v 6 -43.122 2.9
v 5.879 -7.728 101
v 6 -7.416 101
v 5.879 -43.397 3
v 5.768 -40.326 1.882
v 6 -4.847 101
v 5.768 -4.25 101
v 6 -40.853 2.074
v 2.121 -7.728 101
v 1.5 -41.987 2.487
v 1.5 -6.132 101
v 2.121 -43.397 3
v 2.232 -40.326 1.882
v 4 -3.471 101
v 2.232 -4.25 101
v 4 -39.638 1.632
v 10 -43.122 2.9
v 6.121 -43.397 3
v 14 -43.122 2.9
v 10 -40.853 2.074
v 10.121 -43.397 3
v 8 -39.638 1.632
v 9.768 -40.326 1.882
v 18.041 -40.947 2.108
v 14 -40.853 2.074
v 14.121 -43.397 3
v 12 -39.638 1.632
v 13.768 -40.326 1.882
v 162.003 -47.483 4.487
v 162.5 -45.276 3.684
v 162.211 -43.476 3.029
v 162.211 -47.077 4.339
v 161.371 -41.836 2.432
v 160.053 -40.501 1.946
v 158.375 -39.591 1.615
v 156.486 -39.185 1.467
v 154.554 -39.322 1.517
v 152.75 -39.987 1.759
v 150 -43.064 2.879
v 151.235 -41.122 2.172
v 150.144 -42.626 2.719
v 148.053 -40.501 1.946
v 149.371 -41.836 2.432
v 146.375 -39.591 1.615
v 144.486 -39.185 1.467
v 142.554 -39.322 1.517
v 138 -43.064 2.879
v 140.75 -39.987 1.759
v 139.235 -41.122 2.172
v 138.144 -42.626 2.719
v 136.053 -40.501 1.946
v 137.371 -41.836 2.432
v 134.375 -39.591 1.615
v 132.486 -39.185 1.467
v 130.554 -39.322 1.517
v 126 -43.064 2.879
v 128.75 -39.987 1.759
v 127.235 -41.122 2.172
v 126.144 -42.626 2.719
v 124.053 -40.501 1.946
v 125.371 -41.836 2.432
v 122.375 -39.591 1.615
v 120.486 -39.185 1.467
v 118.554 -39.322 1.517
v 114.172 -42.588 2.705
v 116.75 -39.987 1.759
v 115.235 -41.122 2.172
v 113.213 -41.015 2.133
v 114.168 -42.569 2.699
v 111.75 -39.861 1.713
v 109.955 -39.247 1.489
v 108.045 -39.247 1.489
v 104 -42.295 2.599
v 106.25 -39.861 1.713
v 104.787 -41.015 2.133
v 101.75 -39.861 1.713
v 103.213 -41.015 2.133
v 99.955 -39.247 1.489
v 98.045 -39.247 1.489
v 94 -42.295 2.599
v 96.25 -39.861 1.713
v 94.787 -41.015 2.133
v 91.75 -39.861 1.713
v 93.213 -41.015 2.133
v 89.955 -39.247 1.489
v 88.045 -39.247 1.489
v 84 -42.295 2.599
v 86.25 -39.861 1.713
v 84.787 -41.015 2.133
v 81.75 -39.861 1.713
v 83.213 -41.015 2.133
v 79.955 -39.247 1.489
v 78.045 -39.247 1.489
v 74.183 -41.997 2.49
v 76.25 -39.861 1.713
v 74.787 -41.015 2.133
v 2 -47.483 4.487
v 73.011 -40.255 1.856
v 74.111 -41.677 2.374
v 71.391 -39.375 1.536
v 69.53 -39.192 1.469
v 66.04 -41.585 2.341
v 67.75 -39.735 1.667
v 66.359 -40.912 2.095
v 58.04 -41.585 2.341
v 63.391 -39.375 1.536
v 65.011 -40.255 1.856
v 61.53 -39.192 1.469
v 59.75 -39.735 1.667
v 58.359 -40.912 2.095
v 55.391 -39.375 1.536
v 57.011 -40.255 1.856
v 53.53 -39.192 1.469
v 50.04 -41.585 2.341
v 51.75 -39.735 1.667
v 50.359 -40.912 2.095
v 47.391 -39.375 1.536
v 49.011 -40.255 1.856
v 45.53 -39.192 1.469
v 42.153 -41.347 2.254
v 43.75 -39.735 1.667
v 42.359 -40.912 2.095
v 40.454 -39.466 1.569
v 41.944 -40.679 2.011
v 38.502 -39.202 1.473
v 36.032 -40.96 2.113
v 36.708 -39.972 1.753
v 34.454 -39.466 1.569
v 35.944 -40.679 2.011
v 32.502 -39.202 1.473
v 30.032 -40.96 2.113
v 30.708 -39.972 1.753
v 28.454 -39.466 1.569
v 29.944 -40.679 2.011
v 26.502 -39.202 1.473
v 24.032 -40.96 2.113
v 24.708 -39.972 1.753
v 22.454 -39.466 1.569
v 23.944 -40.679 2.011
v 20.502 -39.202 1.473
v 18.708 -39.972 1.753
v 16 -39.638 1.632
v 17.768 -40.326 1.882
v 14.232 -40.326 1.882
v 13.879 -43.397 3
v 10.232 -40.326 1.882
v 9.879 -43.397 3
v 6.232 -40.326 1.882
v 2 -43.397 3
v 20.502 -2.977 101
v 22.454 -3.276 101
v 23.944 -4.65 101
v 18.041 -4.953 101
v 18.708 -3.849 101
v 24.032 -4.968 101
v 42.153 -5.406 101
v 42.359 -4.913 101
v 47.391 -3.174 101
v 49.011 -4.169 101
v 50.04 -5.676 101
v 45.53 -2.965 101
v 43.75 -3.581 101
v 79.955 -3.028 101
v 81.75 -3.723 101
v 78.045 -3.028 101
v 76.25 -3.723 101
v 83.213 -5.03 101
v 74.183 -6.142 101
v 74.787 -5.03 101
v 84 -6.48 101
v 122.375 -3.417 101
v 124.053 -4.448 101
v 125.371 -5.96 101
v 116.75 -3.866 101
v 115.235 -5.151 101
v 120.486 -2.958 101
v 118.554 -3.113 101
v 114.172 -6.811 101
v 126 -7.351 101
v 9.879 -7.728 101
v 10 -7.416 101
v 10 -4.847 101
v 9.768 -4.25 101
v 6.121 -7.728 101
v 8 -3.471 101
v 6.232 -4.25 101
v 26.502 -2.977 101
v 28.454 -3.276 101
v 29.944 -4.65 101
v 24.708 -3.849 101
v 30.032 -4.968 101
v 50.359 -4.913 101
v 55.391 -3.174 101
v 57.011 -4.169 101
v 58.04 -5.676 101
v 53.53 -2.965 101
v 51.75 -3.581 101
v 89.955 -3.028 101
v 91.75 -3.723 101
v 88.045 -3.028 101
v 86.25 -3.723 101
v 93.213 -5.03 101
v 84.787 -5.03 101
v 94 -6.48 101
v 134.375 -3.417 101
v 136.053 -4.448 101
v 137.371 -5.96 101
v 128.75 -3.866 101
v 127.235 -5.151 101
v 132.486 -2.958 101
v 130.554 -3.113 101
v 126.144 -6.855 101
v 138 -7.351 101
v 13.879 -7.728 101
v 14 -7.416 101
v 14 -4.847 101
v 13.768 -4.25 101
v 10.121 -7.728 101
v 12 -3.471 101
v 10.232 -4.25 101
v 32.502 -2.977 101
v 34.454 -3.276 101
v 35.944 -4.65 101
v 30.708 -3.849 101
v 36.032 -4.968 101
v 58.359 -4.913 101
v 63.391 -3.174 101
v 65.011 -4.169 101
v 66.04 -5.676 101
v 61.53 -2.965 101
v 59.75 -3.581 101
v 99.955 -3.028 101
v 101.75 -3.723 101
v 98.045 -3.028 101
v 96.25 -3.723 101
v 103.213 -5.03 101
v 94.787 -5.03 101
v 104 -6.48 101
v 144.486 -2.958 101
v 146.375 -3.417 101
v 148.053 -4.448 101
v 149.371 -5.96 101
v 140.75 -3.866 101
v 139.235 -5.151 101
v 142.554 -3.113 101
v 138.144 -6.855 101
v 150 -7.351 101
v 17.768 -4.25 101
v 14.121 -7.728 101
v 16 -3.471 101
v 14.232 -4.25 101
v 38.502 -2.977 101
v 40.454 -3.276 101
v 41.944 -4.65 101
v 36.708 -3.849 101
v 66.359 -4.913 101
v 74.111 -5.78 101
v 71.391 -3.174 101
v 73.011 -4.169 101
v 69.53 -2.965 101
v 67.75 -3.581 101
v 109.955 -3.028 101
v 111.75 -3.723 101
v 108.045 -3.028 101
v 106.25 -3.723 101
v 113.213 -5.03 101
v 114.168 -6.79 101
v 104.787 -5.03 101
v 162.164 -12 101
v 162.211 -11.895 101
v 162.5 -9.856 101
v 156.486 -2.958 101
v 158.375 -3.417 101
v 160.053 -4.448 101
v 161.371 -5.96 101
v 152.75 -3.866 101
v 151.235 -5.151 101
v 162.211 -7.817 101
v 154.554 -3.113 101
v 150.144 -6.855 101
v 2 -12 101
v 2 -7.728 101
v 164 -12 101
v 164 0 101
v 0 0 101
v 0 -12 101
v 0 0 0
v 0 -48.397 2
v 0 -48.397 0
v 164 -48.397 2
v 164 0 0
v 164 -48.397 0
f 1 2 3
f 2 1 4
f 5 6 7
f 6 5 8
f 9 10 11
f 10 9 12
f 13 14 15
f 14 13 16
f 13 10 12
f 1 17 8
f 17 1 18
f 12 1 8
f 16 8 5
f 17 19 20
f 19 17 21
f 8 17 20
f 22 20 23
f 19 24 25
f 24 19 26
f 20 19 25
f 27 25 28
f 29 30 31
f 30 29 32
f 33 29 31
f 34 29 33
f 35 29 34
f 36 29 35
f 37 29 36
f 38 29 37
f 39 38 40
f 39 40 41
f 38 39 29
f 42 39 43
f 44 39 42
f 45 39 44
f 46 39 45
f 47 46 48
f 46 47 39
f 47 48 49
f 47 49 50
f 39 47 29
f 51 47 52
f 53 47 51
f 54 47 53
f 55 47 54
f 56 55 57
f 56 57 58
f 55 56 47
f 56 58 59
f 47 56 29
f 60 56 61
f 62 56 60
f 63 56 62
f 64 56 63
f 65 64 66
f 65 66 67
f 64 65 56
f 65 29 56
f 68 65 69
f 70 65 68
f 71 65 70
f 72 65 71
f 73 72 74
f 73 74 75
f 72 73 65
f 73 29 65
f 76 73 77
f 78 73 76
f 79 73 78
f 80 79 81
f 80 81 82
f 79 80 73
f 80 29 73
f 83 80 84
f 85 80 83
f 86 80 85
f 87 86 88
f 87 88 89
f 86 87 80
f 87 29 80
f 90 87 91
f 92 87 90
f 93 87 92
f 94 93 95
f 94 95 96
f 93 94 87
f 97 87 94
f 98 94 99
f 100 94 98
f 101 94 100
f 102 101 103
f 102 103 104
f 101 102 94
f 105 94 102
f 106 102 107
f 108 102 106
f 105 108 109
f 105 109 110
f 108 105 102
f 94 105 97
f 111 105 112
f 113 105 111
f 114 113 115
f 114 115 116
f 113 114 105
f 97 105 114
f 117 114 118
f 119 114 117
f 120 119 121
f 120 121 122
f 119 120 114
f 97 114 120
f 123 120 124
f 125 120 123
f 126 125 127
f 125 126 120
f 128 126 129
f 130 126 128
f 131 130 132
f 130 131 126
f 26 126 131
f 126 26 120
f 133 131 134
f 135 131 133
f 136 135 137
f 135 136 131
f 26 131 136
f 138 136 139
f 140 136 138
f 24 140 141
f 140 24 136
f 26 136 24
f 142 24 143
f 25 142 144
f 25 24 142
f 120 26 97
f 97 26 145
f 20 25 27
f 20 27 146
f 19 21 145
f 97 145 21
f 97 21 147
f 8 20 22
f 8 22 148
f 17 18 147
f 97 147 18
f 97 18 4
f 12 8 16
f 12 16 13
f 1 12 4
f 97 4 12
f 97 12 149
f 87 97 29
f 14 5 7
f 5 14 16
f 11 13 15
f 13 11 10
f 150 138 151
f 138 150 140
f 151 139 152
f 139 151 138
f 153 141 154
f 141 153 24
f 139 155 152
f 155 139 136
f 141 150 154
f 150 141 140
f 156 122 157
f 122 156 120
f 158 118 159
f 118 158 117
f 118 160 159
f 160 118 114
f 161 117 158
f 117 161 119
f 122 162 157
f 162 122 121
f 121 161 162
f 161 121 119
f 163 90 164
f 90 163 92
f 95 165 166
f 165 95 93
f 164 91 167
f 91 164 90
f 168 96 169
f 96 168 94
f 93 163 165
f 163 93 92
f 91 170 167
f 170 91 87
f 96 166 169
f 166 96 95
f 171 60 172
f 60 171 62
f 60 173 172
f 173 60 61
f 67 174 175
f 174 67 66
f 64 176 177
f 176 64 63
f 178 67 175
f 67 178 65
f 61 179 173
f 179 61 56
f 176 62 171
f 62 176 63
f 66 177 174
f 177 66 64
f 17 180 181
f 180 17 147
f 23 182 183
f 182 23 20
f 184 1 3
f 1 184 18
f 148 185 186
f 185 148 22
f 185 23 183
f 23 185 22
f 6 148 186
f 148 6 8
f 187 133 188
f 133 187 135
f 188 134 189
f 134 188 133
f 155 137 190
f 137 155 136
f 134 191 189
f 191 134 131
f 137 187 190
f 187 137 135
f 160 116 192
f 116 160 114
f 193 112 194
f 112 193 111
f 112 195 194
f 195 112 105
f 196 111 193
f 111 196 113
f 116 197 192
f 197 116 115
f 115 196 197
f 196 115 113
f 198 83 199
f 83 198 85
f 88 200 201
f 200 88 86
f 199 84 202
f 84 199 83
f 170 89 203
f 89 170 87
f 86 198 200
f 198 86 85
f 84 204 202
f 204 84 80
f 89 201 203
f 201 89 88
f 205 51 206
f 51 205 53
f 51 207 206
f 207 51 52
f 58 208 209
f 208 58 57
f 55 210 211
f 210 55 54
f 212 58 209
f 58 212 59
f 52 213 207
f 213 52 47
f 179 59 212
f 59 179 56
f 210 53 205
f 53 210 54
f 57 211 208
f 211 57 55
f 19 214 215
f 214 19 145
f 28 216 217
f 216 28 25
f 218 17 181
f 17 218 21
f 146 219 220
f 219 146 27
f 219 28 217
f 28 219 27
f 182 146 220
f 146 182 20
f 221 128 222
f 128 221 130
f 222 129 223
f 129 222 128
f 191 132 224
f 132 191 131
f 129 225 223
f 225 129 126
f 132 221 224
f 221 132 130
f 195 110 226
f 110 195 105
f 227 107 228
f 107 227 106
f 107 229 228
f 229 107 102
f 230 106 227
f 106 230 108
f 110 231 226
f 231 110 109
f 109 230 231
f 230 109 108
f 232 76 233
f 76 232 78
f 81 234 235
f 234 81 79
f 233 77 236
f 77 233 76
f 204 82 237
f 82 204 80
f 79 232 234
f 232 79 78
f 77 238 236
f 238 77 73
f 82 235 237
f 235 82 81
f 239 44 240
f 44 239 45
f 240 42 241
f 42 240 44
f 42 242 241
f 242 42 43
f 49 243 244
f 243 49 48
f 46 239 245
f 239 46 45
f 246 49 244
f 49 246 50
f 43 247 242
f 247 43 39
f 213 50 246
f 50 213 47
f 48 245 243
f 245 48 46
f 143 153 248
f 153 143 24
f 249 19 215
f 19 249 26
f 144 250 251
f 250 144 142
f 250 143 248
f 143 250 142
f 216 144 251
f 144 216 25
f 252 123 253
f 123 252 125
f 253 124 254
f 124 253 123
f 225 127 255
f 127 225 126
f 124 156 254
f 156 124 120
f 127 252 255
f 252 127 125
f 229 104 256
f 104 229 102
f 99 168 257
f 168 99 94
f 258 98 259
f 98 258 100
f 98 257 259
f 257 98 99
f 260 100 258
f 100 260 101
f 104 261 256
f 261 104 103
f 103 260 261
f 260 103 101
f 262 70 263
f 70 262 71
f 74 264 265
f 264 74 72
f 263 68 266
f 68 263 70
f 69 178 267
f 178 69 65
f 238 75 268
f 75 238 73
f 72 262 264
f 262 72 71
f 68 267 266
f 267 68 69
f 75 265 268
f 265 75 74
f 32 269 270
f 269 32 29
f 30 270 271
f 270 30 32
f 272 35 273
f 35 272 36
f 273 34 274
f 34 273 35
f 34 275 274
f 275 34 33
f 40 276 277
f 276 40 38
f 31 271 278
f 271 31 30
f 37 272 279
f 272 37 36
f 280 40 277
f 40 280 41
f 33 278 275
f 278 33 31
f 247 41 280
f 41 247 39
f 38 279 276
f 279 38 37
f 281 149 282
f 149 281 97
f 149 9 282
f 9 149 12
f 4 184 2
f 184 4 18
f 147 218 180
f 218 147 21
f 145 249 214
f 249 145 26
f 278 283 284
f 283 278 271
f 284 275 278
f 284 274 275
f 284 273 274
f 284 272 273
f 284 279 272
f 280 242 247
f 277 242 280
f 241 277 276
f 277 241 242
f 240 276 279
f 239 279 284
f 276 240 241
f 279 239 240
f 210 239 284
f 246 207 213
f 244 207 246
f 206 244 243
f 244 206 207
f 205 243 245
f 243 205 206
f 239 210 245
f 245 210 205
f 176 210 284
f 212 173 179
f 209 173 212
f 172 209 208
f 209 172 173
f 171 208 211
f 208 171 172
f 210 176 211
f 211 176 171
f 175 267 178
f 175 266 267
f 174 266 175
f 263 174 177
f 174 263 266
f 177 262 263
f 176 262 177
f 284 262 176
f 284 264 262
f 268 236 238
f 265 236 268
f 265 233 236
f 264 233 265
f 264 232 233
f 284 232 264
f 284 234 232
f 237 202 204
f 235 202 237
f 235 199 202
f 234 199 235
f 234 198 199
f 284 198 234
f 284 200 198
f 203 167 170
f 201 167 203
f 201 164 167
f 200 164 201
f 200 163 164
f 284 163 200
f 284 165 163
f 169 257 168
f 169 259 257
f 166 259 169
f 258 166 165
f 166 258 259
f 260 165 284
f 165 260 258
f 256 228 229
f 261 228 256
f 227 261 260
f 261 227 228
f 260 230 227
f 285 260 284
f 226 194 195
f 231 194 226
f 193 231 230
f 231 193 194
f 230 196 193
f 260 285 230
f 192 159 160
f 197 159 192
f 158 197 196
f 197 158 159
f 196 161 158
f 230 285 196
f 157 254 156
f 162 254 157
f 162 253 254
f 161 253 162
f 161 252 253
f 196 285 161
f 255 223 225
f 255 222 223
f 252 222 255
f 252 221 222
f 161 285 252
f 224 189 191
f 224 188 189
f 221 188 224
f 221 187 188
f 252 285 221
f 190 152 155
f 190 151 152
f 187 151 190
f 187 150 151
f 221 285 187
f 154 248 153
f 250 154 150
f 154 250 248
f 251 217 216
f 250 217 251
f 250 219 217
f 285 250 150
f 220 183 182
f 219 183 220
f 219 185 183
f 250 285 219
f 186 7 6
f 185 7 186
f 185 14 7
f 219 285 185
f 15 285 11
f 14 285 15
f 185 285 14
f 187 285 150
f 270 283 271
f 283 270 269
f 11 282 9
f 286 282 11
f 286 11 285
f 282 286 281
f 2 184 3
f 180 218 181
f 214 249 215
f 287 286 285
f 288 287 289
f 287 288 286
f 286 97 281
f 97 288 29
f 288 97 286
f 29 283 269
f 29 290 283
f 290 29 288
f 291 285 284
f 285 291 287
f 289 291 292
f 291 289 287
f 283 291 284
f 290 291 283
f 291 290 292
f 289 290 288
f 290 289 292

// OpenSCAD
// file: config.scad
//$fs=$fs/2;
//$fa=$fa/2;

r4 = 2.2;
r8 = 4.2;
r10 = 5.2;

layer_height = 0.25;

switch_d = 9.6;

nema17_r_vis = 15.5;
nema17_r_centre = 11.5;
nema17_h_centre = 2;
nema17_h = 43;
nema17_l = 40;

boite_ui_largeur = 28.5;
boite_ui_l = 46;

support_laser = 24;

r3 = 1.75;
r3_2d = 1.5;
r3_vis = 1.65;
r3_head = 3.6;
m3_r = r3;
m3_nut_d = 7;
m3_nut_d2 = 6.2;
m3_nut_h = 3;

m4_r = 2.3;
m4_nut_d = 8.4;
m4_nut_d2 = 7.5;
m4_nut_h = 3.5;

608_r = 23/2;
608_h = 8;

laser_printer_l = 609;
laser_printer_lg = 456;


module support_nut(d=3, l_screw1 = 20, l_screw2 = 20, l_nut = 20, h_screw2 = 0.2){
    if(d==3){
        screw_r = r3;
        nut_r = m3_nut_d/2;
        nut_h = m3_nut_h;
        cylinder(nut_h, r = nut_r, $fn = 6, center = true);
        translate([0, 0, -l_screw1])cylinder(l_screw1 +1, r = screw_r, $fn = 8);
        translate([0, 0, m3_nut_h/2+ h_screw2])cylinder(l_screw2, r = screw_r, $fn = 8);
        l = m3_nut_d*cos(30);
        translate([0, -l/2, -nut_h/2]) cube([l_nut, l,nut_h]);
    } else if(d==4){
        screw_r = r4;
        nut_r = m4_nut_d/2;
        nut_h = m4_nut_h;
        cylinder(nut_h, r = nut_r, $fn = 6, center = true);
        translate([0, 0, -l_screw1])cylinder(l_screw1 +1, r = screw_r, $fn = 8);
        translate([0, 0, m4_nut_h/2+ h_screw2])cylinder(l_screw2, r = screw_r, $fn = 8);
        l = m4_nut_d*cos(30);
        translate([0, -l/2, -nut_h/2]) cube([l_nut, l,nut_h]);
    }
}


module nut(d=3, center = false){
    nut_r = m3_nut_d/2;
    nut_h = m3_nut_h;
    if(d==3){
        nut_r = m3_nut_d/2;
        nut_h = m3_nut_h;
    } 
    cylinder(nut_h, r = nut_r, $fn = 6, center = center);
}



module m3(h, nut = false, head = false){
    cylinder(h, m3_r, m3_r, $fn=16);
    if(nut){
        cylinder(m3_nut_h, r = m3_nut_d/2, $fn = 6);
    }
}

module m3_nut(h){
    cylinder(m3_nut_h, r = m3_nut_d/2, $fn = 6);
    translate([0, -m3_nut_d2/2, 0]) cube([h, m3_nut_d2, m3_nut_h]);
}

module m4(h, nut = false, head = false){
    cylinder(h, m4_r, m4_r);
    if(nut){
        cylinder(m4_nut_h, r = m4_nut_d/2, $fn = 6);
    }
}

module m5(h, nut = false, head = false){
    cylinder(h, r = 2.7);
}

m8_nut_d = 15;
m8_nut_d2 = 13;
m8_nut_h = 6.5;
module m8(h, nut = false, head = false){
    cylinder(h, r = r8);
    if(nut){
        cylinder(m8_nut_h, r = m8_nut_d/2, $fn = 6);
    }
}

module cube_arrondi(x, y, z, r=2){
    hull(){
        translate([(x/2-r), (y/2-r), 0]) cylinder(z,r=r);
        translate([(x/2-r), -(y/2-r), 0]) cylinder(z,r=r);
        translate([-(x/2-r), (y/2-r), 0]) cylinder(z,r=r);
        translate([-(x/2-r), -(y/2-r), 0]) cylinder(z,r=r);
    }
}

module demi_glissiere(r, l, h){
    cylinder(h, r, r);
    translate([-r, 0, 0]) cube([r*2, l, h]);
}


module nema17_2d(){
    nema17_l = 43;
    nema17_h = 3;
    polygon([[0,nema17_h], [nema17_h,0]
            , [nema17_l-nema17_h,0],[nema17_l,nema17_h]
            , [nema17_l,nema17_l-nema17_h],[nema17_l-nema17_h,nema17_l]
            , [nema17_h,nema17_l],[0,nema17_l-nema17_h] ]);
}

module nema17_2d2(){
    translate([nema17_r_vis, nema17_r_vis] ) circle(r3_2d);
    translate([nema17_r_vis, -nema17_r_vis] ) circle(r3_2d);
    translate([-nema17_r_vis, nema17_r_vis] ) circle(r3_2d);
    translate([-nema17_r_vis, -nema17_r_vis] ) circle(r3_2d);
    circle(nema17_r_centre);
}


module nema17(){
    translate([-nema17_h/2, -nema17_h/2, -nema17_l/2] ) linear_extrude(nema17_l) nema17_2d();
    
    h = nema17_h/2+6;
    translate([nema17_r_vis, nema17_r_vis, 0] )rotate([0, 0, 0]) cylinder(h, r = r3);
    translate([nema17_r_vis, -nema17_r_vis, 0] )rotate([0, 0, 0]) cylinder(h, r = r3);
    translate([-nema17_r_vis, nema17_r_vis, 0] )rotate([0, 0, 0]) cylinder(h, r = r3);
    translate([-nema17_r_vis, -nema17_r_vis, 0] )rotate([0, 0, 0]) cylinder(h, r = r3);
    cylinder(h, nema17_r_centre, nema17_r_centre);
    cylinder(h+14, r = 8);
    
    translate([-8.5, 0, -nema17_l/2] ) cube([17,30, 10]);
}

module corner(l_corner, h_corner, lg_corner){
    translate([0, lg_corner, 0]) rotate([90, 0, 0]) linear_extrude(lg_corner) polygon([[0,0], [l_corner, 0], [0, h_corner]]);
}

nema17();

/**
 * 2D
 **/

module m3_2d(){
    circle(r3_2d);
}


module cran_x(_l, e, cran, inv){
    difference(){
        square([_l, e]);
        if(inv){
            for(i=[-round(_l/cran):round(_l/cran)]){
                translate([_l/2 + cran/2 - 2*i*cran, -1]) square([cran, e+2]);
            }
        }else{
            for(i=[-round(_l/cran):round(_l/cran)]){
                translate([_l/2 - cran/2 - 2*i*cran, -1]) square([cran, e+2]);
            }
        }
    }
}

module cran_y(_l, e, cran, inv){
    translate([e, 0]) rotate([0, 0, 90]) cran_x(_l, e, cran, inv); 
}

module whole_2d(type_vis){
    if(type_vis == 3){
        circle(1.5);
    } else if(type_vis == 4){
        circle(2);
    } else {
        echo("whole_2d " + type_vis);
    }
}

module nuts_2d(type_vis){
    if(type_vis == 3){
        translate([-1.5, 0])square([3, 20]);
        translate([-5.5/2, 10])square([5.5, 2.5]);
    } else if(type_vis == 4){
        translate([-2, 0])square([4, 30]);
        translate([-7/2, 20])square([7, 3.5]);
    } else {
        echo("nuts_2d " + type_vis);
    }
}

module cran_x_vis(_l, e, cran, type_vis = 3, trous = [0.1, 0.5, 0.9]){
    difference(){
        square([_l, e]);
        for(i=[-round(_l/cran):round(_l/cran)]){
                translate([_l/2 - cran/2 - 2*i*cran, -1]) square([cran, e+2]);
            }
        
    }
    for(i = trous){
        j = round((i-0.5)*_l/(2*cran));
        translate([_l/2  - 2*j*cran, e/2]) whole_2d(type_vis);
    }
}

module cran_x_nuts(_l, e, cran, type_vis = 3, trous = [0.1, 0.5, 0.9]){
    difference(){
        square([_l, e]);
        for(i=[-round(_l/cran):round(_l/cran)]){
                translate([_l/2 + cran/2 - 2*i*cran, -1]) square([cran, e+2]);
        }
    }
    for(i = trous){
        j = round((i-0.5)*_l/(2*cran));
        translate([_l/2  - 2*j*cran, e/2]) nuts_2d(type_vis);
    }
}

module cran_y_vis(_l, e, cran, type_vis = 3, trous = [0.1, 0.5, 0.9]){
    translate([e, 0]) rotate([0, 0, 90]) cran_x_vis(_l, e, cran, type_vis, trous);
}

module cran_y_nuts(_l, e, cran, type_vis = 3, trous = [0.1, 0.5, 0.9]){
    translate([0, _l]) rotate([0, 0, -90]) cran_x_nuts(_l, e, cran, type_vis, trous);
}
// main file
use <config.scad>

h = 100;
e2 = 10;
e=2;

angle = 20;
l = tan(angle)*h;

re = 10;

nb = 4;



/*n=10;
pas = 10;
r_pas = 5.5;
lg=pas*n+2*e;

module toto2(){
    difference(){
       hull(){
           translate([0,0,0])cube([lg, l+e2+e, 2]);
           translate([0,0,h]) cube([ lg, e2+e,1]);
       }
       //translate([-lg/2+e,l+e,e]) rotate([angle,0,0])cube([lg-2*e,10,2*h]);
       
       translate([e,l+e+e2/2,e]) rotate([angle,0,0])cube([lg-2*e,10,2*h]);
       for(i= [0 : n-1] ){
            translate([(i+0.5)*pas+e,l+e+e2/2,e]) rotate([angle,0,0]) cylinder(r=r_pas,2*h);
       }
           
   }
}*/


n = 4;

pas0=4;
pas1=6;
pas2=8;
pas3=10;
pas4=12;
               
lg=n*(pas0+pas1+pas2+pas3+pas4)+2*e;
e_h = 3;

module toto3(){
    difference(){
       hull(){
           translate([0,0,0])cube([lg, l+e2+e, 2]);
           translate([0,0,h]) cube([ lg, e2+e,1]);
       }
       //translate([-lg/2+e,l+e,e]) rotate([angle,0,0])cube([lg-2*e,10,2*h]);
       
        
       translate([e,l+e+e2/2,e_h]) rotate([angle,0,0])
       union(){
           cube([lg-2*e,10,2*h]);
           for(i= [0 : n-1] ){
               translate([(i+0.5)*pas0,pas0/2-3.5,0])            cylinder(r=pas0/2+0.5,2*h);
               
               translate([(pas0)*n+(i+0.5)*pas1,pas1/2-4,0]) cylinder(r=pas1/2+0.5,2*h);
           
               translate([(pas0+pas1)*n+(i+0.5)*pas2,pas2/2-4,0]) cylinder(r=pas2/2+0.5,2*h);
           
               translate([(pas0+pas1+pas2)*n+(i+0.5)*pas3,pas3/2-4,0]) cylinder(r=pas3/2+0.5,2*h);
           
               translate([(pas0+pas1+pas2+pas3)*n+(i+0.5)*pas4,pas4/2-4,0]) cylinder(r=pas4/2+0.5,2*h);
       }
   }
       
       
           
   }
}


mirror([0,1,0])toto3();
